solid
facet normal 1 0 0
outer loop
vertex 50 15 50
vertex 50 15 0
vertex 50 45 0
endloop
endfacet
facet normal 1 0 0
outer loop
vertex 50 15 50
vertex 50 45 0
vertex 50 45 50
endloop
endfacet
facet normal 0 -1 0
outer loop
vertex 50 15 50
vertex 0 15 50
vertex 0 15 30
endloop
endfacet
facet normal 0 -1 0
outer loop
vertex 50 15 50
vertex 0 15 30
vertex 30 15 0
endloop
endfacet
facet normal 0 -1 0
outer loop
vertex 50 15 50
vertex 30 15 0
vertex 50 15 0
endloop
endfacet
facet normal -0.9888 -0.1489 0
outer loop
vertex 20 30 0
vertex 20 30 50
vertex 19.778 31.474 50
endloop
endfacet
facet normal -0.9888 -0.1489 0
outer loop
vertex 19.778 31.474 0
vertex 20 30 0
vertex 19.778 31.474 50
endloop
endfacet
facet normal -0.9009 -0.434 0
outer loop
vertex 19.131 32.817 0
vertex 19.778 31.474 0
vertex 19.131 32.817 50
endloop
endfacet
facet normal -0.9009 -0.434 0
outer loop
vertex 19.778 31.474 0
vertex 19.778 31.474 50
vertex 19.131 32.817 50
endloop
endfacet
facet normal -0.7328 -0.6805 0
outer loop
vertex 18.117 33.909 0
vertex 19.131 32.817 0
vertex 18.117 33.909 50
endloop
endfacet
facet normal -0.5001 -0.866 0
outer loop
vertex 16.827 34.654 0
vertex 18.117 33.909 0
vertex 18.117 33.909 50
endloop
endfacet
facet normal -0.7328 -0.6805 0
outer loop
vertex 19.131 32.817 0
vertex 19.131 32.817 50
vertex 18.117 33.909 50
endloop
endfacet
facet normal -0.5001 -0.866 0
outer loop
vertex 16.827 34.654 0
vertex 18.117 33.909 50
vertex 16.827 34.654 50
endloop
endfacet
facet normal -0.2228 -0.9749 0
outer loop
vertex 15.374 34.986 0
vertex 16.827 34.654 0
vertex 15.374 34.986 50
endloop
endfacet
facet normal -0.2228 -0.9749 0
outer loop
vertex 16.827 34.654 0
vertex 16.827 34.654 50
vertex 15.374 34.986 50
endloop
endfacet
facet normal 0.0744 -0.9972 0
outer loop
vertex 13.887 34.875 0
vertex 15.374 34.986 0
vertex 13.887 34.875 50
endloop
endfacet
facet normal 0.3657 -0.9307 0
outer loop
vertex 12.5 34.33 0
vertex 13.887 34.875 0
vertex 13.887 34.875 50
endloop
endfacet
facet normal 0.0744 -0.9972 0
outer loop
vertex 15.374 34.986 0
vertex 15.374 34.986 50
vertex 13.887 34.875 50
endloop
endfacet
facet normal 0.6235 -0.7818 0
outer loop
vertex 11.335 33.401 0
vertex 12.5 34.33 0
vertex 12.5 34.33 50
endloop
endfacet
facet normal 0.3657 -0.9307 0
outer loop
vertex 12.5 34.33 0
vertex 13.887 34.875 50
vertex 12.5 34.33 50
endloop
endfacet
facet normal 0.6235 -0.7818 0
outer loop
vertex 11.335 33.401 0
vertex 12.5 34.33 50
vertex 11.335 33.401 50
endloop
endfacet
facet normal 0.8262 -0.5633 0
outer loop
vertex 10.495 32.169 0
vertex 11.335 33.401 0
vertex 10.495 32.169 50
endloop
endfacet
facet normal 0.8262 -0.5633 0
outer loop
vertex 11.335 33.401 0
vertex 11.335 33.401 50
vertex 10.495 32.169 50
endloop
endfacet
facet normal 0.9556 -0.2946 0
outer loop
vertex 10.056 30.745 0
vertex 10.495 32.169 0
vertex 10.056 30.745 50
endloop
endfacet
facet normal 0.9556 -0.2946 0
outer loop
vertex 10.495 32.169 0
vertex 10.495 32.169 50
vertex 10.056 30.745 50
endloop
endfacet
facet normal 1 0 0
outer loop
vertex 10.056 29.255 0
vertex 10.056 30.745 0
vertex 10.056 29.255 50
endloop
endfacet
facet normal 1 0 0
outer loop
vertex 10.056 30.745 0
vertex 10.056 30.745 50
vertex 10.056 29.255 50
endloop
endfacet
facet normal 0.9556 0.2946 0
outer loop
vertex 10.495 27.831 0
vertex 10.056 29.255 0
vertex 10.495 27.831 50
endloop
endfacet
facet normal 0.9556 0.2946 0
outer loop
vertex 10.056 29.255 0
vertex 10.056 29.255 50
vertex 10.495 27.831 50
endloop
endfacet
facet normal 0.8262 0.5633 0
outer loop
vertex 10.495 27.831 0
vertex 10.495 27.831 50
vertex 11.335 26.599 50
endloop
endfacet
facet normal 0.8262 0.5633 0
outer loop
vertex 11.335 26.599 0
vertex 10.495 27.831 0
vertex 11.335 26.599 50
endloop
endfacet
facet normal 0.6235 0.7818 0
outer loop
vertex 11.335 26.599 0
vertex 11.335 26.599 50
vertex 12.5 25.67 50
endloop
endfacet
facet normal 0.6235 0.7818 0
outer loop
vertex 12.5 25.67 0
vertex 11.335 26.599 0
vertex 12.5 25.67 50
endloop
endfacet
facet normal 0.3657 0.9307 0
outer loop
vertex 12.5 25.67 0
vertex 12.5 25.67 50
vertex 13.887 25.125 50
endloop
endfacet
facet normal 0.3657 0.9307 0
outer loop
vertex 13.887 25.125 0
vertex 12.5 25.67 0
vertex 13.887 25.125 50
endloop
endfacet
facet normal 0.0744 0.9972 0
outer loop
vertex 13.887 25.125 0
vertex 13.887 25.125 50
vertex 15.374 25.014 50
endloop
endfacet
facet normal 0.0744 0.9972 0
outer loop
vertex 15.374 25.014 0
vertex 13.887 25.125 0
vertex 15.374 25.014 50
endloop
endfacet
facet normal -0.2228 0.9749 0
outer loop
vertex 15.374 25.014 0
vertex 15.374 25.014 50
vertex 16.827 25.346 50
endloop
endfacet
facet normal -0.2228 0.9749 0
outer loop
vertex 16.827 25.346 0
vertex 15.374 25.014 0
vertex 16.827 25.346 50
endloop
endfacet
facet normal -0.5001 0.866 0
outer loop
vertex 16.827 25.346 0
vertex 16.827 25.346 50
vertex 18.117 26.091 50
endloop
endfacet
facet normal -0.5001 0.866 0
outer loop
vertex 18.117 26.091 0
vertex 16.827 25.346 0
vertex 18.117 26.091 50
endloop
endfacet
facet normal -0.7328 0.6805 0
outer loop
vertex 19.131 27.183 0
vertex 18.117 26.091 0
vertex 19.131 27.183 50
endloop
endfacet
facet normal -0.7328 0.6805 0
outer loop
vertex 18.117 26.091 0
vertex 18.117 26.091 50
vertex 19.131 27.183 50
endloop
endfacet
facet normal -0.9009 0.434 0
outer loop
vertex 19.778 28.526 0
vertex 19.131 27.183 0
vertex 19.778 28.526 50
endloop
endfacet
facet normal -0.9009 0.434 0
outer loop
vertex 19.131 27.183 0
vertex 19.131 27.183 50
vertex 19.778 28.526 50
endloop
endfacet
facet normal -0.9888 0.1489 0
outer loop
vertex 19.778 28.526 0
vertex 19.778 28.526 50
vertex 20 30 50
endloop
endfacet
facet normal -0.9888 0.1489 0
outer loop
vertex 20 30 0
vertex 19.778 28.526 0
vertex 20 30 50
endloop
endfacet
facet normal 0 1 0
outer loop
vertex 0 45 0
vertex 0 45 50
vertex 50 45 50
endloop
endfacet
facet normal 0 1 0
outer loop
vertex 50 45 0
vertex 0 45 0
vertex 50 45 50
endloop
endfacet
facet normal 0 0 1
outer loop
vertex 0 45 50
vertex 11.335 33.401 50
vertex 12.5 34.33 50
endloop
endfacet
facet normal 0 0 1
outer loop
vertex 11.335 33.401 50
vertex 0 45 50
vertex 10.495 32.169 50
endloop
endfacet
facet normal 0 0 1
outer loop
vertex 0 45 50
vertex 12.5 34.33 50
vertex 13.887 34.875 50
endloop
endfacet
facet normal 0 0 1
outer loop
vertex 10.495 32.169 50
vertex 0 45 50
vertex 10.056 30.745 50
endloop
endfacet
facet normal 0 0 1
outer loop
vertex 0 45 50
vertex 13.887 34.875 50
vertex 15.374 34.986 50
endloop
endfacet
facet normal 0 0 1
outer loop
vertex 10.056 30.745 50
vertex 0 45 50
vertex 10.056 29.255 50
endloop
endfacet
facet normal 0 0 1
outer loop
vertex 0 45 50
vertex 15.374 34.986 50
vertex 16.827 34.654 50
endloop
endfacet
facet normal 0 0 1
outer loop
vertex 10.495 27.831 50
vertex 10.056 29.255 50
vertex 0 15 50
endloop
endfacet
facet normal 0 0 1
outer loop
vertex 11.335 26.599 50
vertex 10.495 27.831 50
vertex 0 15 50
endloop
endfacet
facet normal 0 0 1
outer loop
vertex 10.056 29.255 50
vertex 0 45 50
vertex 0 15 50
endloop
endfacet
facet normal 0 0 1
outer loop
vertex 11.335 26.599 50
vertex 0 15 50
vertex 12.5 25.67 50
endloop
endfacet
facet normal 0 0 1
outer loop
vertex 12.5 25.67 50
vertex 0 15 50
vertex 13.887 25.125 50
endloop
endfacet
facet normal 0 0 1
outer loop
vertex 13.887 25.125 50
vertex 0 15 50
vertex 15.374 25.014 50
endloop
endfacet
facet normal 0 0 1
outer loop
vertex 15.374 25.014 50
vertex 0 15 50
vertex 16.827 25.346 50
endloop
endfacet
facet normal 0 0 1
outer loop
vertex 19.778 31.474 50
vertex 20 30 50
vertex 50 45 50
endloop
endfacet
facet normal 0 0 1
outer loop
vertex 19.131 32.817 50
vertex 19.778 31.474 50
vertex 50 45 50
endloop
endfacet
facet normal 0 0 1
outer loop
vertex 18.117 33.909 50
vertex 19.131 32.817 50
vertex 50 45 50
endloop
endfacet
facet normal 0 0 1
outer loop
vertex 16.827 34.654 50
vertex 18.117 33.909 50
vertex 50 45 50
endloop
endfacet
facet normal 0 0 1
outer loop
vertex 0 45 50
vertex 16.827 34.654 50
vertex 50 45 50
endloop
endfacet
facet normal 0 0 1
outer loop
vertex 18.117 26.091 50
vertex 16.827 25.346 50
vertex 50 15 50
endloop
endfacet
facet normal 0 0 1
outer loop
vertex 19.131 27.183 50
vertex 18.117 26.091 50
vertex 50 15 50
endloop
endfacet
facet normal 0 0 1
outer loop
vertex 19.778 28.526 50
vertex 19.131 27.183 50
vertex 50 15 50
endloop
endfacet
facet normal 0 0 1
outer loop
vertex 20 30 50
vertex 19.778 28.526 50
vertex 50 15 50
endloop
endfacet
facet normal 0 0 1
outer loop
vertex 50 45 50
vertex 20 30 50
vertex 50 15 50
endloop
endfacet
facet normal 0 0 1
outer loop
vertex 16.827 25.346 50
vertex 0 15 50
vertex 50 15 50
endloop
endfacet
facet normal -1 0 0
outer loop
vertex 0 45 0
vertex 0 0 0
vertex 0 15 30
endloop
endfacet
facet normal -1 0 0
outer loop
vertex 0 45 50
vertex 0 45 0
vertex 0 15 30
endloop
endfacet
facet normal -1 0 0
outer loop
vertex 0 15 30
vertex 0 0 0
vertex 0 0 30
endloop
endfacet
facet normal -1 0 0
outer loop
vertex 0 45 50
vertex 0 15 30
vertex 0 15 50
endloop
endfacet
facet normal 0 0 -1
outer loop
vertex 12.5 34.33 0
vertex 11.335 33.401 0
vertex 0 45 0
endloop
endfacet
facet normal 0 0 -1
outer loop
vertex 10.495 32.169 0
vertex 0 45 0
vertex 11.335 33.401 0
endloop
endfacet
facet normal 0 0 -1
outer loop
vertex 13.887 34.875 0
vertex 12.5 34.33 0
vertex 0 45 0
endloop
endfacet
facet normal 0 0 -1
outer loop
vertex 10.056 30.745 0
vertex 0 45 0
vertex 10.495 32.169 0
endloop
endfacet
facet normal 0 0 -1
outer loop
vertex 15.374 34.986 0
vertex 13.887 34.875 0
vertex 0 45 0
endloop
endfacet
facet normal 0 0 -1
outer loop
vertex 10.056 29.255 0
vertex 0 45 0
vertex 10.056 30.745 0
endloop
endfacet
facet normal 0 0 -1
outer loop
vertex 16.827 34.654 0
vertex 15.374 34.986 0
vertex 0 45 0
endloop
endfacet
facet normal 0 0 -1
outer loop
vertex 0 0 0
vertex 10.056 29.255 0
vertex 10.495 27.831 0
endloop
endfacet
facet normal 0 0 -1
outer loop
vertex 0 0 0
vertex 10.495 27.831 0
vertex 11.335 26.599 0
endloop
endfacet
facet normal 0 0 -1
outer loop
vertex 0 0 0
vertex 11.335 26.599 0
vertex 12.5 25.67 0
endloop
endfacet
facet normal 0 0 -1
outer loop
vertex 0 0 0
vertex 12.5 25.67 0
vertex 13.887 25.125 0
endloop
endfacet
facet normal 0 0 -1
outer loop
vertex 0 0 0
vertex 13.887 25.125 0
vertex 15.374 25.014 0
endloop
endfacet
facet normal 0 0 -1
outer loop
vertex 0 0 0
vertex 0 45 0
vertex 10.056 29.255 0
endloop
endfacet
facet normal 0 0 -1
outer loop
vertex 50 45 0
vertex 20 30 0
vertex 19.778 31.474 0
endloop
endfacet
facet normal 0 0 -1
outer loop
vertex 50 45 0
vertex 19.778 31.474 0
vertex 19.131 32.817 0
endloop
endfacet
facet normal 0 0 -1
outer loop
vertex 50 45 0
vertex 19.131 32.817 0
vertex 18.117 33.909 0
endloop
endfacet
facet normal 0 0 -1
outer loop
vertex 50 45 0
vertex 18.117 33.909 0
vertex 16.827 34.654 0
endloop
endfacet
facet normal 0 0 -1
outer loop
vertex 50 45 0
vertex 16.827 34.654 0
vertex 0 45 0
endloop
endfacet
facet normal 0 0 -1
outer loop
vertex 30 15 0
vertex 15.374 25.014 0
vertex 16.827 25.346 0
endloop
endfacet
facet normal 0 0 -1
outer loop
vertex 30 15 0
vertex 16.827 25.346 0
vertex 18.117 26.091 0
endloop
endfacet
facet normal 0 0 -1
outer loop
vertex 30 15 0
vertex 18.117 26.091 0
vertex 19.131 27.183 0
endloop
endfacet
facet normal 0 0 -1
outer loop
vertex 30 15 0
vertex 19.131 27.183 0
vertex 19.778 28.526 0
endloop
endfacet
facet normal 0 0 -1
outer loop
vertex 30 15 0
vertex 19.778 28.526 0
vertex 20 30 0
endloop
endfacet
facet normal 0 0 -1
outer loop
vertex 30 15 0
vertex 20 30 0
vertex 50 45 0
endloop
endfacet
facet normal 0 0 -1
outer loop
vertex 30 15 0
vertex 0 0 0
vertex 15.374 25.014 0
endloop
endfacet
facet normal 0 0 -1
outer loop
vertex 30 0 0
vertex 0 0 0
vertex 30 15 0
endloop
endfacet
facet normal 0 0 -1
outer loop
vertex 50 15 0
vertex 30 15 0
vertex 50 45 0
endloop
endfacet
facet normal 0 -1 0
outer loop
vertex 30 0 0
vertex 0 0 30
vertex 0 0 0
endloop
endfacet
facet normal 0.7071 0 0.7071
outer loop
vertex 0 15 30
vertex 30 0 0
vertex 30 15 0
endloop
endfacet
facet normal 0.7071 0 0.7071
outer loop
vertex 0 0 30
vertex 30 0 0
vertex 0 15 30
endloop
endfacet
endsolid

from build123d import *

# Parameters (mm, degrees)
F1_DEPTH = 15
F3_W     = 50
F3_H     = 50
F4_DEPTH = 30
F5_R     = 5
F6_DEPTH = 50


with BuildPart() as f1:
    # F0 (on Front) → F1 (new body)
    with BuildSketch(Plane.XZ):
        Polygon((0, 30), (0, 0), (30, 0), align=None)
    extrude(amount=-F1_DEPTH)

    # F3 (on offset) → F4 (join)
    with BuildSketch(Plane.XZ.offset(-15)):
        with Locations((25, 25)):
            Rectangle(F3_W, F3_H)
    extrude(amount=-F4_DEPTH)

    # F5 (on face) → F6 (cut, through all)
    with BuildSketch(Plane.XY.offset(50)):
        with Locations((15, 30)):
            Circle(F5_R)
    extrude(amount=-F6_DEPTH, mode=Mode.SUBTRACT)


solid = f1.part
